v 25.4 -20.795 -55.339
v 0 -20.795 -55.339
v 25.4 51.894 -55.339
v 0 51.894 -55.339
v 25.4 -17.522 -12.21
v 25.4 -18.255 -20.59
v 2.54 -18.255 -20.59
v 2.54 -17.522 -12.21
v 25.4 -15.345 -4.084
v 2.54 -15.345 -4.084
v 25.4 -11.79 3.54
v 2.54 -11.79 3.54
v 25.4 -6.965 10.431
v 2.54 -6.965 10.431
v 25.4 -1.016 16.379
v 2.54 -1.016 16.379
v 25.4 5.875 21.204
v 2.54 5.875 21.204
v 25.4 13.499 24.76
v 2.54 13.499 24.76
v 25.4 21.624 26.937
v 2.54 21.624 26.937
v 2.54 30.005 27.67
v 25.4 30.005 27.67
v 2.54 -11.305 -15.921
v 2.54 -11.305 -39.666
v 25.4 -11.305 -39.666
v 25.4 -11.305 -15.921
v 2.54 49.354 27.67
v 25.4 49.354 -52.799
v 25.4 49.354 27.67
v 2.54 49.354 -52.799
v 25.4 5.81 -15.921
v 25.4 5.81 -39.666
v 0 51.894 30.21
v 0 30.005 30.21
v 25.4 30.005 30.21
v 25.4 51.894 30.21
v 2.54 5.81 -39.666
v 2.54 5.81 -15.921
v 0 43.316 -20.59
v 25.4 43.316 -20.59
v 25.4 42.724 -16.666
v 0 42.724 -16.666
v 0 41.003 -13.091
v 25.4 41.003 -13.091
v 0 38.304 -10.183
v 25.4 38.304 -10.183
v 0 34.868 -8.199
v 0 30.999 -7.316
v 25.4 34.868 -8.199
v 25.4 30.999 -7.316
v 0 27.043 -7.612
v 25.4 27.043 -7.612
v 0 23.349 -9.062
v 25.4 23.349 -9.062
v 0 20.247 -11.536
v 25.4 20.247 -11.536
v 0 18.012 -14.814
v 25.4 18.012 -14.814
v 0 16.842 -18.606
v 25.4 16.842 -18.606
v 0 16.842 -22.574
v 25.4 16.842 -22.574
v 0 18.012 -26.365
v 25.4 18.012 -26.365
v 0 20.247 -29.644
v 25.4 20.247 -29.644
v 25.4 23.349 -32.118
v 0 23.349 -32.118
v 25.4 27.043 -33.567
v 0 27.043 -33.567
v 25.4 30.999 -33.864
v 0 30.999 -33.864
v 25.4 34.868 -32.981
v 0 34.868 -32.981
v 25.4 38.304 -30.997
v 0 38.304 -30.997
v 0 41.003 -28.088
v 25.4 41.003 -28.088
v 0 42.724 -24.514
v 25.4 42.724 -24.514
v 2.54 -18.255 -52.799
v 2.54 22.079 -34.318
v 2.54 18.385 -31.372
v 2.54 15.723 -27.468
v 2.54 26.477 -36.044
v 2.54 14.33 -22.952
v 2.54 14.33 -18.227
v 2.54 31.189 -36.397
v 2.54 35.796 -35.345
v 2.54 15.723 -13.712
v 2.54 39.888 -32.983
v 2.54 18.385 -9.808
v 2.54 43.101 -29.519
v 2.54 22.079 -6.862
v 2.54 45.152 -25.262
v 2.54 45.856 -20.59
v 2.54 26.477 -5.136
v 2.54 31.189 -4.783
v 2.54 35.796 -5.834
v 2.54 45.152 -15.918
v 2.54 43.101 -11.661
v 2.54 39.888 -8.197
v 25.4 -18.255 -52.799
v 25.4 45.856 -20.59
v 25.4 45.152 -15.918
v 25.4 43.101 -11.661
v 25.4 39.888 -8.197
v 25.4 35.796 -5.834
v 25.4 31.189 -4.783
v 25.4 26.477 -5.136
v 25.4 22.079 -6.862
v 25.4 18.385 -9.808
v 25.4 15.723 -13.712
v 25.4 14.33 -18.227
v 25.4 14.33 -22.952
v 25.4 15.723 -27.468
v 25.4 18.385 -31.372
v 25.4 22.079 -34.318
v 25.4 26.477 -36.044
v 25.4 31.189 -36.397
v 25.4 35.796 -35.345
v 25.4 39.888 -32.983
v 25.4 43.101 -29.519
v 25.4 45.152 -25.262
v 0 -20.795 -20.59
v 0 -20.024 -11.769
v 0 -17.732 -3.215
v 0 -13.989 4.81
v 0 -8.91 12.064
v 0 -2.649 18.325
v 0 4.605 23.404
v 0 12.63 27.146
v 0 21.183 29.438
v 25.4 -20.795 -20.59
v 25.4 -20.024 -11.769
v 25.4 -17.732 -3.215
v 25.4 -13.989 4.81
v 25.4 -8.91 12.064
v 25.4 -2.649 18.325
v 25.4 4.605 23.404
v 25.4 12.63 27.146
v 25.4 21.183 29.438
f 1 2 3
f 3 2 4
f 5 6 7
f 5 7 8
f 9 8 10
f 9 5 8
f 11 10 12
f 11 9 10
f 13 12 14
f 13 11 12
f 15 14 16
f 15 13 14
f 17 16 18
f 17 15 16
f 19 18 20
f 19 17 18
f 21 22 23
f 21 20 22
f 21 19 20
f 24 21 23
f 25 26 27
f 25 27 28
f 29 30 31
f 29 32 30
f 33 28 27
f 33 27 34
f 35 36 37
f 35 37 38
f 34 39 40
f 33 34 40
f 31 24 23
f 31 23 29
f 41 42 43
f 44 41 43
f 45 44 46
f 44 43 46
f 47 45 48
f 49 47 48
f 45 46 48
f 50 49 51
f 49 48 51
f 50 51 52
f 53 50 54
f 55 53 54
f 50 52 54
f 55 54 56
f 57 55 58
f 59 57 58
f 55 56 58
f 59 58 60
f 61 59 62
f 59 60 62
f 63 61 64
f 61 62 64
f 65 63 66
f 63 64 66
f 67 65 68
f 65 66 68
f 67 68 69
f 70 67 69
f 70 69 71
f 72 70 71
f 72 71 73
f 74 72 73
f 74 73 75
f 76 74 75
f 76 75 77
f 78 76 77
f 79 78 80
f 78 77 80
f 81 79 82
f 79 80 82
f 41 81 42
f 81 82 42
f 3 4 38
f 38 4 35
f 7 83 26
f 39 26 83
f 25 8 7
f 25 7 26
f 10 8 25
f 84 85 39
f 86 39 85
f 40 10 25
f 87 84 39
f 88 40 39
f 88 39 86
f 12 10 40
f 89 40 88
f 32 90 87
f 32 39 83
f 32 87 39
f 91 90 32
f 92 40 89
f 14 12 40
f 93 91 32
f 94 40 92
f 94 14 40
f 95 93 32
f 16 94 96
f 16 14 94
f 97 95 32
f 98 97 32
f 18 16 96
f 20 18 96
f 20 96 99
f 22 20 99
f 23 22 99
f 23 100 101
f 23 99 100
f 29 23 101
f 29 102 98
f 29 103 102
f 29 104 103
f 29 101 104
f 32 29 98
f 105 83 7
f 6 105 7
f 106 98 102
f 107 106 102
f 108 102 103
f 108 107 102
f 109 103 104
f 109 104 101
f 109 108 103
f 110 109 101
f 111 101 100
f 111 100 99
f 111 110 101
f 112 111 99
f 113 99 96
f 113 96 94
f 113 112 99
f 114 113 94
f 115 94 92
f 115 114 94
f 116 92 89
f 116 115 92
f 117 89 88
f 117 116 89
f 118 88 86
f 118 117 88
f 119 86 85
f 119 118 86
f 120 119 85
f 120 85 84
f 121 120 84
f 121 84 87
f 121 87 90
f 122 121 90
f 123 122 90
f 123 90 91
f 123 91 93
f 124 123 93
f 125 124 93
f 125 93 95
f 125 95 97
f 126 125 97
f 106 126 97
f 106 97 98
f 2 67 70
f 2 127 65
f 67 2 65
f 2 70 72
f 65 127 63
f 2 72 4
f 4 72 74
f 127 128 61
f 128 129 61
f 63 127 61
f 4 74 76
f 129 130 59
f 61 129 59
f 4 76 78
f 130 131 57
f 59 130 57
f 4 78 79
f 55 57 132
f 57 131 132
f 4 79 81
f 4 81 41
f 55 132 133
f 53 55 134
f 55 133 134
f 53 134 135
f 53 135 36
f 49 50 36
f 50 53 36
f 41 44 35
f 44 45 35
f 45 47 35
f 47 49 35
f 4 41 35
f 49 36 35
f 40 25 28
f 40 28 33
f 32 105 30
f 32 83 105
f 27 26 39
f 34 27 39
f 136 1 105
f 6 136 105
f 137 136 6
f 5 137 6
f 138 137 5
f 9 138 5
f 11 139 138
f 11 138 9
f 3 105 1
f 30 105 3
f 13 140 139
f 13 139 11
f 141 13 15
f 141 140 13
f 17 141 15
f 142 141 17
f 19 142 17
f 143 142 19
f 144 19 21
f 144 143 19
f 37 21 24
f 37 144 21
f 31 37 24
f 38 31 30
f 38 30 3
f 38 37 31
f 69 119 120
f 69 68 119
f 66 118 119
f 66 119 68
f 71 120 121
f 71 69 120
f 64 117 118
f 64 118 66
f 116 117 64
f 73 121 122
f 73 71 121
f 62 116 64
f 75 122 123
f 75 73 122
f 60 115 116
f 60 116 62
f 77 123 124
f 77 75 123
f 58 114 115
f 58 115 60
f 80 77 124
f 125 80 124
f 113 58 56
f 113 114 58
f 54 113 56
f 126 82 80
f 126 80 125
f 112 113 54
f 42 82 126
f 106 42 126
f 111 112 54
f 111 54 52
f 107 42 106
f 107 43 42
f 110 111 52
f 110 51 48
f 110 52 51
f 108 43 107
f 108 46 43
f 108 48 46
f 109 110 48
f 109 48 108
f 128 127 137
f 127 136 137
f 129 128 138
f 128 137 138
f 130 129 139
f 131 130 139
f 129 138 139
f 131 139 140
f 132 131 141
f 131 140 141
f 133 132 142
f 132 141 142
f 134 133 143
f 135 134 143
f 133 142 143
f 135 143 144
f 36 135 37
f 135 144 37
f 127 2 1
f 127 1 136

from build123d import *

# Parameters (mm, degrees)
F0_W     = 72.689131
F0_H     = 85.548859
F1_DEPTH = 25.4
F2_R     = 50.8
F3_R     = 13.311226
F4_DEPTH = 25.4
F5_T     = -2.54
F6_W     = 17.114856
F6_H     = 23.744739
F7_DEPTH = 25.4


with BuildPart() as f1:
    # F0 (on Right) → F1 (new body)
    with BuildSketch(Plane.YZ):
        with Locations((15.549161, -12.564396)):
            Rectangle(F0_W, F0_H)
    extrude(amount=F1_DEPTH)

    # F2
    f2_edges = [f1.edges().sort_by_distance(p)[0] for p in [
        (12.7, -20.795405, 30.210033),
    ]]
    fillet(f2_edges, radius=F2_R)

    # F3 (on face) → F4 (cut)
    with BuildSketch(Plane.YZ.offset(25.4)):
        with Locations((30.004595, -20.589967)):
            Circle(F3_R)
    extrude(amount=-F4_DEPTH, mode=Mode.SUBTRACT)

    # F5
    f5_openings = [f1.faces().sort_by_distance(p)[0] for p in [
        (25.4, 16.684078, -15.097146),
    ]]
    offset(amount=F5_T, openings=f5_openings)

    # F6 (on Right) → F7 (join)
    with BuildSketch(Plane.YZ):
        with Locations((-2.747506, -27.793449)):
            Rectangle(F6_W, F6_H)
    extrude(amount=F7_DEPTH)


solid = f1.part
